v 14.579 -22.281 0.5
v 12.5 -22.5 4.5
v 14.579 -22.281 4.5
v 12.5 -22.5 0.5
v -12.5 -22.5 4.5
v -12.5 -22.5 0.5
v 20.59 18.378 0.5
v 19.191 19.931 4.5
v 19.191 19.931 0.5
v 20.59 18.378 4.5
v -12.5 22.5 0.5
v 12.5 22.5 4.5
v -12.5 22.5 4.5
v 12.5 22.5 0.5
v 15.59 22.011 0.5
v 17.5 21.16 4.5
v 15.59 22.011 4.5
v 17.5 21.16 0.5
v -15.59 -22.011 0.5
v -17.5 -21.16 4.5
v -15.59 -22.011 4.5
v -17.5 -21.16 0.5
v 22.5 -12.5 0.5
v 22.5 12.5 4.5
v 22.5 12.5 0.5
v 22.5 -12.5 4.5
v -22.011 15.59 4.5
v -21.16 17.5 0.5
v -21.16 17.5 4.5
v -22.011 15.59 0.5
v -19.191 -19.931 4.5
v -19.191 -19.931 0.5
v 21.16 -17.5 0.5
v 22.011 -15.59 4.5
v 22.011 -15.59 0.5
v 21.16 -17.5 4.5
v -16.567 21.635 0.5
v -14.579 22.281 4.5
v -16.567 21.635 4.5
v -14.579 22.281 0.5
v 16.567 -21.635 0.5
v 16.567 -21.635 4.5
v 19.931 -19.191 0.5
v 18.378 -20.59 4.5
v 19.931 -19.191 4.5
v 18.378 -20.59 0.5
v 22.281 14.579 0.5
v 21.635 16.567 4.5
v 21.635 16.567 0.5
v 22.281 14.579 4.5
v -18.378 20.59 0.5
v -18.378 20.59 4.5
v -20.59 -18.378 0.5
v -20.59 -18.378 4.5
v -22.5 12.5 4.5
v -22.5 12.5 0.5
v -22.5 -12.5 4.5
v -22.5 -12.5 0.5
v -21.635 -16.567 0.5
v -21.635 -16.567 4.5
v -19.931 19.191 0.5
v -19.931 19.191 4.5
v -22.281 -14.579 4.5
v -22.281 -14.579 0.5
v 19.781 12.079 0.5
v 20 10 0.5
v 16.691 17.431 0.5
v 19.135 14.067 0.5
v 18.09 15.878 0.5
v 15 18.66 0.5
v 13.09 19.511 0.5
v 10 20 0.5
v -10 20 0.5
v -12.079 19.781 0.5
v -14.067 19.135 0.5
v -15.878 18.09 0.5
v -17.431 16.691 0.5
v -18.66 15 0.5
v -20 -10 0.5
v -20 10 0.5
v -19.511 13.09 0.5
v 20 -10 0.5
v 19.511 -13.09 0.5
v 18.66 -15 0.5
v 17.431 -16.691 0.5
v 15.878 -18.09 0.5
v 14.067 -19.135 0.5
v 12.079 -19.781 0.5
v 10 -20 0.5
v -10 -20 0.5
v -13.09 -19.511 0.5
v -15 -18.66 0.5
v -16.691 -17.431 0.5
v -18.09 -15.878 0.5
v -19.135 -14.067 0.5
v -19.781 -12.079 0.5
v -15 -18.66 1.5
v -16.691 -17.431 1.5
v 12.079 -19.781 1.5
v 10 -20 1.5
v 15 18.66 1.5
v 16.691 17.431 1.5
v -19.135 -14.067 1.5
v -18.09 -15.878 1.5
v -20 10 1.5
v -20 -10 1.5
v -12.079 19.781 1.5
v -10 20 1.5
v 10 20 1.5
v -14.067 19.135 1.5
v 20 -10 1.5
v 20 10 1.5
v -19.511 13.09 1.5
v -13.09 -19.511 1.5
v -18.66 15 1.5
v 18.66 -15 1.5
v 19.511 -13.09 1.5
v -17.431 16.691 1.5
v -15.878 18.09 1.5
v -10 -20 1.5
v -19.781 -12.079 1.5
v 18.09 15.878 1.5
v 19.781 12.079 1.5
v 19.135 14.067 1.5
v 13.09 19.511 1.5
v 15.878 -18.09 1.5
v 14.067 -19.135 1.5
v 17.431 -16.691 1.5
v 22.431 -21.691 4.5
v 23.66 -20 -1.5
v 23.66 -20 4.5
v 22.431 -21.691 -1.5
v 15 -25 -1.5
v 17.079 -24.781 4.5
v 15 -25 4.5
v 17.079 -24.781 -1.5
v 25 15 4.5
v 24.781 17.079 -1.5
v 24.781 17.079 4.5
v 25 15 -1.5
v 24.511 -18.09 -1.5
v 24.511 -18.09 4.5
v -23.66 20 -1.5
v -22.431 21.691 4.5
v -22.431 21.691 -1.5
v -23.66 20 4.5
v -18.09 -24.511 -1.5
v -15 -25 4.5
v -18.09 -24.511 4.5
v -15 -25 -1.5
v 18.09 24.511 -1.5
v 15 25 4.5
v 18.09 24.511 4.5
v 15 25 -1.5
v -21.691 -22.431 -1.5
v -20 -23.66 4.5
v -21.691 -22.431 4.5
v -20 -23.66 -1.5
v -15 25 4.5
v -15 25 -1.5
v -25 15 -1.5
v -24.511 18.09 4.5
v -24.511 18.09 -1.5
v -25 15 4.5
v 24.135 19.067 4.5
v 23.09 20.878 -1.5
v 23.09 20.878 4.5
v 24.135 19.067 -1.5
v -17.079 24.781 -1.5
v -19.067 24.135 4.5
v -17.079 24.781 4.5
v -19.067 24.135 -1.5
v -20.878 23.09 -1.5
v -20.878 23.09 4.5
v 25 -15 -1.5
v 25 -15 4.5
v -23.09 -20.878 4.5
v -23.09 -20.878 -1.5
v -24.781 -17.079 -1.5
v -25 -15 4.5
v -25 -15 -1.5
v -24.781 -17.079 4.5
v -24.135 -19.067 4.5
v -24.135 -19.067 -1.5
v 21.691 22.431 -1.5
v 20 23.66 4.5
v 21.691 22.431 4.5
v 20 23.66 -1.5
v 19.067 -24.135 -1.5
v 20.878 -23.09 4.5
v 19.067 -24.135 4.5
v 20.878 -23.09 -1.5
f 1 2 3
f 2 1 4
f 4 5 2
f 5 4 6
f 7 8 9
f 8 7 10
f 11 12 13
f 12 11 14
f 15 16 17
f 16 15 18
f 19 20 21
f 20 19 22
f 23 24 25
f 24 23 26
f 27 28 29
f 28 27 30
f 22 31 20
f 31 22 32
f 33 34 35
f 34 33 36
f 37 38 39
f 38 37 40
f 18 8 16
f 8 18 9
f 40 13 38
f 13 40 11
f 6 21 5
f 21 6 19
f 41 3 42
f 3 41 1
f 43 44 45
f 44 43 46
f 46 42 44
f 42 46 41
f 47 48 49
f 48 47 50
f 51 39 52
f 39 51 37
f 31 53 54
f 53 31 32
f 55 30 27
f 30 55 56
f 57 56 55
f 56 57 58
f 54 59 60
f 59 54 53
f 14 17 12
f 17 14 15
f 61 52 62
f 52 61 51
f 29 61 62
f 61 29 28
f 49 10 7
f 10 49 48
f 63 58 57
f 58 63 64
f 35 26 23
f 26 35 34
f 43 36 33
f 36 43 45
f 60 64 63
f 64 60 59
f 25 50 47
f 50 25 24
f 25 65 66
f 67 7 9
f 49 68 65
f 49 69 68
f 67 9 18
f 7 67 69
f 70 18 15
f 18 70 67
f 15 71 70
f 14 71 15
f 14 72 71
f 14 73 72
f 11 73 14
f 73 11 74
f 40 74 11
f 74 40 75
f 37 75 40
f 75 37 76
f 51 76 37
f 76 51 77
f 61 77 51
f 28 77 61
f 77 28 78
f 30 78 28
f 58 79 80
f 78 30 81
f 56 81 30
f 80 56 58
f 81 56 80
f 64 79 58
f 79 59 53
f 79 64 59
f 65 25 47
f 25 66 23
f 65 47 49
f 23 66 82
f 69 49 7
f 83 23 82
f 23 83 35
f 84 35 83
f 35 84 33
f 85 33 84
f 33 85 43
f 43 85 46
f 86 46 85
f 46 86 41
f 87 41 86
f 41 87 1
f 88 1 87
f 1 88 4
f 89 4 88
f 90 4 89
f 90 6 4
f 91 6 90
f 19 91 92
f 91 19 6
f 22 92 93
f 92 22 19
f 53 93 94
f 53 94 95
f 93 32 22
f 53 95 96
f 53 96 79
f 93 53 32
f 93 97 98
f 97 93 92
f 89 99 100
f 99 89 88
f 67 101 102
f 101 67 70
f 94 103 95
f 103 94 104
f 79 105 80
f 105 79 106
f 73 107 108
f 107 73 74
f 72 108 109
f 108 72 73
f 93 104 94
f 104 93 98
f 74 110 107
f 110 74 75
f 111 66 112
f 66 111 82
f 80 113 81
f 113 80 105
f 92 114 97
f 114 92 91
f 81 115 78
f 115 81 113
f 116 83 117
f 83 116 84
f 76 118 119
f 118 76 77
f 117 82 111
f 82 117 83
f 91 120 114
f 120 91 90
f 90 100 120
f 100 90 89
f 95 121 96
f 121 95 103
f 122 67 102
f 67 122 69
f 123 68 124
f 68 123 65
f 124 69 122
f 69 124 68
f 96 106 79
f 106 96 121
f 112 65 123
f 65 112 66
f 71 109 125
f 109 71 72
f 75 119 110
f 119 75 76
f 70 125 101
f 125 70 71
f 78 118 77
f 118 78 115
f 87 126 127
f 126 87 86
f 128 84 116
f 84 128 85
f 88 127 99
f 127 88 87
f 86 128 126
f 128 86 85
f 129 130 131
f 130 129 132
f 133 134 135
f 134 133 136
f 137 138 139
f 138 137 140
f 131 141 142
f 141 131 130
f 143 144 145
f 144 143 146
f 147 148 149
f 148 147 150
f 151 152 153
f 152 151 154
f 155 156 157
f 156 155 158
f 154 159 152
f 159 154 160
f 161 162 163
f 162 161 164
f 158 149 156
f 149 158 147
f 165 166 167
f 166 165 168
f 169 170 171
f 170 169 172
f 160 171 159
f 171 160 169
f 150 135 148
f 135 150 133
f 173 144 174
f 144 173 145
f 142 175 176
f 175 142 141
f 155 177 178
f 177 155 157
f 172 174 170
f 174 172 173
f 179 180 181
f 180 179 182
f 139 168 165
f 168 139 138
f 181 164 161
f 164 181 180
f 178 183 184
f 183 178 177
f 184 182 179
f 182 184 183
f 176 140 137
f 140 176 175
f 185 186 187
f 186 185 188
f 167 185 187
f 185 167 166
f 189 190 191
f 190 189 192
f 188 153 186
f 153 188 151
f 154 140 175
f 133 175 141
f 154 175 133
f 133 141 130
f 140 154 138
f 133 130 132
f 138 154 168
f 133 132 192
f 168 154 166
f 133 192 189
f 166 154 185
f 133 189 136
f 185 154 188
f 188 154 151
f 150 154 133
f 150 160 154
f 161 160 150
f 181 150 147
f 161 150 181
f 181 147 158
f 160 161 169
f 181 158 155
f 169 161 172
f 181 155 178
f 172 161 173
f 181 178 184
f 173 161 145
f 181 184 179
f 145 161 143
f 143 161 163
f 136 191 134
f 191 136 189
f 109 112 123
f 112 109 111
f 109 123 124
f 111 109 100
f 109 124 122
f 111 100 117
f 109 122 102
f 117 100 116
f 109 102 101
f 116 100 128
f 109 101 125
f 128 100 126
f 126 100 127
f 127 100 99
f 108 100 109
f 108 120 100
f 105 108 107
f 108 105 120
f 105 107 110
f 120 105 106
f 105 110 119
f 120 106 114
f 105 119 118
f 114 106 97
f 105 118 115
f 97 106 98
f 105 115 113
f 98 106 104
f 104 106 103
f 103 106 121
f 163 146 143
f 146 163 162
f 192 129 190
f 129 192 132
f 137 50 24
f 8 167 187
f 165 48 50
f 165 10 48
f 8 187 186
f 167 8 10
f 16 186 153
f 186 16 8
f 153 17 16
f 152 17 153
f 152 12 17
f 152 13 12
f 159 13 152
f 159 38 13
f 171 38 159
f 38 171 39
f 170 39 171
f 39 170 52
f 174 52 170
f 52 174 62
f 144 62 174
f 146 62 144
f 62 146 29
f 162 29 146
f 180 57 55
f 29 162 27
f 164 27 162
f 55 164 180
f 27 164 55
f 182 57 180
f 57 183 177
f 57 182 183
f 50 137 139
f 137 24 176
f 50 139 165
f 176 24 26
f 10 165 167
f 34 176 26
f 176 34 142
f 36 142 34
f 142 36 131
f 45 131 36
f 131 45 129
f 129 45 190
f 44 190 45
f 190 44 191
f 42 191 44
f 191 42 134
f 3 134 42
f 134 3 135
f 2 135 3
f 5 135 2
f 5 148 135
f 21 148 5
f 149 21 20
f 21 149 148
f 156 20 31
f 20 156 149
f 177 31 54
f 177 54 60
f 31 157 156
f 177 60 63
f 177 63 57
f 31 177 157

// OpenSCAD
/*
 * Test for a stamp mold
 */
echo(version=version());

logo = "resist.png"; // res 354 x 355
logox = 354; 
logoy = 355; 

module roundedRect(size, radius) {  
	linear_extrude(height=size.z, center=true) {
		offset(radius) offset(-radius) {
			square([size.x, size.y], center = true);
		}
	}
}

// Base plate
// ----------
plateWidth = 50;
plateLength = 50;
plateThickNess = 3;
cornerRadius = 10;

difference() {  
	union() {
		difference() {
			roundedRect([plateWidth, plateLength, plateThickNess], cornerRadius);
			translate([0, 0, 2]) {
				scale([.9 * plateWidth / logox, .9 * plateWidth / logoy, .02]) {
					color("white") {
						rotate([0, 0, -90]) {
							surface(file=logo, invert=true, center=true);
						}
					}
				}
        // the groove around the picture
        difference() {
          roundedRect([plateWidth -  5, plateLength -  5, plateThickNess], cornerRadius);
          roundedRect([plateWidth - 10, plateLength - 10, plateThickNess * 1.1], cornerRadius);
        }
			}
		}
		// The frame
		translate([0, 0, (plateThickNess / 1)]) {
			difference() {
				roundedRect([plateWidth, plateLength, plateThickNess], cornerRadius);
				roundedRect([plateWidth - 5, plateLength - 5, plateThickNess * 1.1], cornerRadius);
			}
		}
	}
}
